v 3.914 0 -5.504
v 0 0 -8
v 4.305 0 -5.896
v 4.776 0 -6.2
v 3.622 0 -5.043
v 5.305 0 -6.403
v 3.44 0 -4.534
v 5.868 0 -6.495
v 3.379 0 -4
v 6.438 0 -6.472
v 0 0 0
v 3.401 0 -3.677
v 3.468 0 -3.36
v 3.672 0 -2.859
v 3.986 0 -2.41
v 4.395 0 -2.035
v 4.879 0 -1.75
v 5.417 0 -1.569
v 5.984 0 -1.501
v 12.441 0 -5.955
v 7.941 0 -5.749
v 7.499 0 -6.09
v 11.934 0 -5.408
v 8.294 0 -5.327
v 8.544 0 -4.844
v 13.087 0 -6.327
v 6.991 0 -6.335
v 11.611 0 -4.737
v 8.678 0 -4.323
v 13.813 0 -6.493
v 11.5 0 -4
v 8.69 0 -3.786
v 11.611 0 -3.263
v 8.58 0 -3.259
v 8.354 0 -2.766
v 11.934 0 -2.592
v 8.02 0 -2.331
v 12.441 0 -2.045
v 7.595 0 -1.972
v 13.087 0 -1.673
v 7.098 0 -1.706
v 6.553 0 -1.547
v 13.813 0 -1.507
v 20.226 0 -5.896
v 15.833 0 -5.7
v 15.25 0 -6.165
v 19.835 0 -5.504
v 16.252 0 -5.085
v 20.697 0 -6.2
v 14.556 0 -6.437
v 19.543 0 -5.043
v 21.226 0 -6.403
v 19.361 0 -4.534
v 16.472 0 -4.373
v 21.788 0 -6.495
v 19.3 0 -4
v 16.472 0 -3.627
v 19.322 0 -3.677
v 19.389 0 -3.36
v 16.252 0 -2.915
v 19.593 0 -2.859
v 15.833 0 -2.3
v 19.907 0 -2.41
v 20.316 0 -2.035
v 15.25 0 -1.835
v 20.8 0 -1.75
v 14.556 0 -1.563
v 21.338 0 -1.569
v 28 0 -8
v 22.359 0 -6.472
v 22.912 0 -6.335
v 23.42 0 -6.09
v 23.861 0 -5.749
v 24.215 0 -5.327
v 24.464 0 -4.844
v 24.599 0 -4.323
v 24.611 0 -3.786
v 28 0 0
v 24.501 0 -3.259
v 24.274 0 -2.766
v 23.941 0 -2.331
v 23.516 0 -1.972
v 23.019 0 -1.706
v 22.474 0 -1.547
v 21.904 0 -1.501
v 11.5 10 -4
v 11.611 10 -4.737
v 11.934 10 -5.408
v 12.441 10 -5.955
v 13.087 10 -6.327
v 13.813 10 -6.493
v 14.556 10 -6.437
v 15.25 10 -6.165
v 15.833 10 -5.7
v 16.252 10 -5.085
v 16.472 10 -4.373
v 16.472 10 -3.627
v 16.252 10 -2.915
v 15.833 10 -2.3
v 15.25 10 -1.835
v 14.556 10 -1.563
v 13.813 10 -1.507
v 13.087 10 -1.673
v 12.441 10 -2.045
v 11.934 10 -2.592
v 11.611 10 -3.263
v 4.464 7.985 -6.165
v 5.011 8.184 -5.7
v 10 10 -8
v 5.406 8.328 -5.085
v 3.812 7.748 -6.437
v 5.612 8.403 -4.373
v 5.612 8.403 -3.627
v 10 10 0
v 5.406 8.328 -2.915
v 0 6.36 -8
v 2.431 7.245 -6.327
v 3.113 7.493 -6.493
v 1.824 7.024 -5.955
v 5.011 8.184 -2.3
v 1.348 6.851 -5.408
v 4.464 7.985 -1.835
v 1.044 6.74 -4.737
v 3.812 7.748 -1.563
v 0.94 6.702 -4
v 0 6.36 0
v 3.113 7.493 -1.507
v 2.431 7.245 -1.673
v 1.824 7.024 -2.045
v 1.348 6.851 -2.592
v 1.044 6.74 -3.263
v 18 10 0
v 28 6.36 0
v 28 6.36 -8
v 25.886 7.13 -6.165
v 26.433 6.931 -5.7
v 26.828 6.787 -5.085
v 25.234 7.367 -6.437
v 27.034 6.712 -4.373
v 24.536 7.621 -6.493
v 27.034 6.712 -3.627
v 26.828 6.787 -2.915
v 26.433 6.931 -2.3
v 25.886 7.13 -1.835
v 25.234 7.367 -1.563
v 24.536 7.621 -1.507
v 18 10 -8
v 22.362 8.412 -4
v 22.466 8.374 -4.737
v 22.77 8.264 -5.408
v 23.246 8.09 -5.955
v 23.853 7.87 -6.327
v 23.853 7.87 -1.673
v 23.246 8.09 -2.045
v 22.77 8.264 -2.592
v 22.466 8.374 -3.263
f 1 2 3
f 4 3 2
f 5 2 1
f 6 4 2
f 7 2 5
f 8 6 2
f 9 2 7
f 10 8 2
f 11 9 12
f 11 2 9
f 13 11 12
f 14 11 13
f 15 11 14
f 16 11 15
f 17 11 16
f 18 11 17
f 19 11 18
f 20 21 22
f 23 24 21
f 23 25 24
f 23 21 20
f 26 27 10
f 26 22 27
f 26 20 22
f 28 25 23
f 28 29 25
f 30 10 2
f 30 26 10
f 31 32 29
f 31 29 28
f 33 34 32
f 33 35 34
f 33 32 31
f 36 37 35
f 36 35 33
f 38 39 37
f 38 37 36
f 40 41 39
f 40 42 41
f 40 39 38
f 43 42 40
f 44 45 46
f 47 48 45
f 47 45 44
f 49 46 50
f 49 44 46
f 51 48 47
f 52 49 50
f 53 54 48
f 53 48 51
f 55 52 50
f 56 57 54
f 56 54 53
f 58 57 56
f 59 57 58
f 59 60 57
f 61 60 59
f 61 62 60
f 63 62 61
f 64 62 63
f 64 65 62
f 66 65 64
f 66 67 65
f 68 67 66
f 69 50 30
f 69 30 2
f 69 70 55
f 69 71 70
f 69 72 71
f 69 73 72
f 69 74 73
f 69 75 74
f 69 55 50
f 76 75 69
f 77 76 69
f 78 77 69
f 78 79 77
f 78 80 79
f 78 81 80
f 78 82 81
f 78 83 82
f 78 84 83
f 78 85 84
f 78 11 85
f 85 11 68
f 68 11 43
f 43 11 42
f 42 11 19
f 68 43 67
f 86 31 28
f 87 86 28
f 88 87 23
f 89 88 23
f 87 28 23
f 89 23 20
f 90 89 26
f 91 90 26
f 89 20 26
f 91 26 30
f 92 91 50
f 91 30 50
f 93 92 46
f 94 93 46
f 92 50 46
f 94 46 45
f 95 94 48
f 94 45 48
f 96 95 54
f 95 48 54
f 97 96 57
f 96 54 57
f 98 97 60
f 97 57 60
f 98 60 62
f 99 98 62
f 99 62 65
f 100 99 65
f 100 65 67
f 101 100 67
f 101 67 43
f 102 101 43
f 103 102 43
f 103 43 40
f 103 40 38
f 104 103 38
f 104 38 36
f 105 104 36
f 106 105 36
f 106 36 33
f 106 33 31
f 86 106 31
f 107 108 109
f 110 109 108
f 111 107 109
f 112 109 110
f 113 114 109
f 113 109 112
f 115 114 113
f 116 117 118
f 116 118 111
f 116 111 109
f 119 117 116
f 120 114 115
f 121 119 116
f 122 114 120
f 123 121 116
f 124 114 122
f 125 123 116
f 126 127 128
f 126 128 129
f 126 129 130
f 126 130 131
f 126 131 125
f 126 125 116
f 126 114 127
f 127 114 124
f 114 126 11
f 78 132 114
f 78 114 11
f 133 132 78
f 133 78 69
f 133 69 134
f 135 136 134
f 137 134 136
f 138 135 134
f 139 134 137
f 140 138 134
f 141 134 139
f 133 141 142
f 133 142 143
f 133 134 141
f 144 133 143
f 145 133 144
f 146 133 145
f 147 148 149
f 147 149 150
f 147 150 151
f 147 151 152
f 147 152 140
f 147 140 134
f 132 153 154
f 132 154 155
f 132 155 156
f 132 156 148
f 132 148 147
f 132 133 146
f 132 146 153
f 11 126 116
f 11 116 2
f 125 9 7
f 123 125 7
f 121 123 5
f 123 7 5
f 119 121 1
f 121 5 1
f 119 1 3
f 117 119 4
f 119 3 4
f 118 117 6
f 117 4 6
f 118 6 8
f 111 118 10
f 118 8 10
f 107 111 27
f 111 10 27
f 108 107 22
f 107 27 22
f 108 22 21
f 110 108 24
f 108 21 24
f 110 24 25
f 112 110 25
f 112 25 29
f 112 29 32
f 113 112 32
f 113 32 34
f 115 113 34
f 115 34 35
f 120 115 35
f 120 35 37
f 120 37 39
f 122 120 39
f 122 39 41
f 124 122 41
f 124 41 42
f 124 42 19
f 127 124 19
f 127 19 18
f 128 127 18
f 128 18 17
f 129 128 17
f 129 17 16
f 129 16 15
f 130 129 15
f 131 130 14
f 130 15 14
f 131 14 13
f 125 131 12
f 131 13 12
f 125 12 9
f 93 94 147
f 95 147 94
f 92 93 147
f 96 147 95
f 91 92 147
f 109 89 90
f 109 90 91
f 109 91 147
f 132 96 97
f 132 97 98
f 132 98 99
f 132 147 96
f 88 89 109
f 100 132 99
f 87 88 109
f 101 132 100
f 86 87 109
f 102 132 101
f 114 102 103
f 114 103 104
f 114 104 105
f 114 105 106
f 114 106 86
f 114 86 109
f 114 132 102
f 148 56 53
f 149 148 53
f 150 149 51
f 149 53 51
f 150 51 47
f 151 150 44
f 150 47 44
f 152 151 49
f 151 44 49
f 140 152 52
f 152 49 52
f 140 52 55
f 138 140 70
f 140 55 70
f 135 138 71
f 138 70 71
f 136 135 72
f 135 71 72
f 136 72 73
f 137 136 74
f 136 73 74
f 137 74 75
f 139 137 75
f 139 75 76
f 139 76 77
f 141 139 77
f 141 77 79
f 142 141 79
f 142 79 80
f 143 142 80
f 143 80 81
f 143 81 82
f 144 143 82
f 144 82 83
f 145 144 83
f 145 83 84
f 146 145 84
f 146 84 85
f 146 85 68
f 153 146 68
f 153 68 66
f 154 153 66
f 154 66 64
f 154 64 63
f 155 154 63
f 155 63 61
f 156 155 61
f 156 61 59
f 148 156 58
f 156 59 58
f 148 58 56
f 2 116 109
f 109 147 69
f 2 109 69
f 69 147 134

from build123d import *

# Parameters (mm, degrees)
EXTRUDE_1_DEPTH    = 8
HOLE_WIZARD_M6_1_D = 5
HOLE_WIZARD_M6_2_D = 5
HOLE_WIZARD_M6_3_D = 5


with BuildPart() as part:
    # 草图1 → 凸台-拉伸1 (new body)
    with BuildSketch(Plane.XY):
        Polygon((0, 0), (28, 0), (28, 6.360297657), (18, 10), (10, 10), (0, 6.360297657), align=None)
    extrude(amount=-EXTRUDE_1_DEPTH)

    # M6 螺纹孔1 (through all)
    with Locations(Plane(origin=(0, 10, 0), x_dir=(1, 0, 0), z_dir=(0, 1, 0))):
        with Locations((14, 4)):
            Hole(HOLE_WIZARD_M6_1_D / 2)

    # M6 螺纹孔2 (through all)
    with Locations(Plane(origin=(5.31953806, 14.615310703, 0), x_dir=(0.9396926207859093, -0.34202014332566627, 0), z_dir=(0.34202014332566627, 0.9396926207859093, 0))):
        with Locations((20.636043466, 4)):
            Hole(HOLE_WIZARD_M6_2_D / 2)

    # M6 螺纹孔3 (through all)
    with Locations(Plane(origin=(-2.044160264, 5.616284167, 0), x_dir=(0.9396926207859093, 0.3420201433256663, 0), z_dir=(-0.3420201433256663, 0.9396926207859093, 0))):
        with Locations((5.675349916, 4)):
            Hole(HOLE_WIZARD_M6_3_D / 2)


solid = part.part
